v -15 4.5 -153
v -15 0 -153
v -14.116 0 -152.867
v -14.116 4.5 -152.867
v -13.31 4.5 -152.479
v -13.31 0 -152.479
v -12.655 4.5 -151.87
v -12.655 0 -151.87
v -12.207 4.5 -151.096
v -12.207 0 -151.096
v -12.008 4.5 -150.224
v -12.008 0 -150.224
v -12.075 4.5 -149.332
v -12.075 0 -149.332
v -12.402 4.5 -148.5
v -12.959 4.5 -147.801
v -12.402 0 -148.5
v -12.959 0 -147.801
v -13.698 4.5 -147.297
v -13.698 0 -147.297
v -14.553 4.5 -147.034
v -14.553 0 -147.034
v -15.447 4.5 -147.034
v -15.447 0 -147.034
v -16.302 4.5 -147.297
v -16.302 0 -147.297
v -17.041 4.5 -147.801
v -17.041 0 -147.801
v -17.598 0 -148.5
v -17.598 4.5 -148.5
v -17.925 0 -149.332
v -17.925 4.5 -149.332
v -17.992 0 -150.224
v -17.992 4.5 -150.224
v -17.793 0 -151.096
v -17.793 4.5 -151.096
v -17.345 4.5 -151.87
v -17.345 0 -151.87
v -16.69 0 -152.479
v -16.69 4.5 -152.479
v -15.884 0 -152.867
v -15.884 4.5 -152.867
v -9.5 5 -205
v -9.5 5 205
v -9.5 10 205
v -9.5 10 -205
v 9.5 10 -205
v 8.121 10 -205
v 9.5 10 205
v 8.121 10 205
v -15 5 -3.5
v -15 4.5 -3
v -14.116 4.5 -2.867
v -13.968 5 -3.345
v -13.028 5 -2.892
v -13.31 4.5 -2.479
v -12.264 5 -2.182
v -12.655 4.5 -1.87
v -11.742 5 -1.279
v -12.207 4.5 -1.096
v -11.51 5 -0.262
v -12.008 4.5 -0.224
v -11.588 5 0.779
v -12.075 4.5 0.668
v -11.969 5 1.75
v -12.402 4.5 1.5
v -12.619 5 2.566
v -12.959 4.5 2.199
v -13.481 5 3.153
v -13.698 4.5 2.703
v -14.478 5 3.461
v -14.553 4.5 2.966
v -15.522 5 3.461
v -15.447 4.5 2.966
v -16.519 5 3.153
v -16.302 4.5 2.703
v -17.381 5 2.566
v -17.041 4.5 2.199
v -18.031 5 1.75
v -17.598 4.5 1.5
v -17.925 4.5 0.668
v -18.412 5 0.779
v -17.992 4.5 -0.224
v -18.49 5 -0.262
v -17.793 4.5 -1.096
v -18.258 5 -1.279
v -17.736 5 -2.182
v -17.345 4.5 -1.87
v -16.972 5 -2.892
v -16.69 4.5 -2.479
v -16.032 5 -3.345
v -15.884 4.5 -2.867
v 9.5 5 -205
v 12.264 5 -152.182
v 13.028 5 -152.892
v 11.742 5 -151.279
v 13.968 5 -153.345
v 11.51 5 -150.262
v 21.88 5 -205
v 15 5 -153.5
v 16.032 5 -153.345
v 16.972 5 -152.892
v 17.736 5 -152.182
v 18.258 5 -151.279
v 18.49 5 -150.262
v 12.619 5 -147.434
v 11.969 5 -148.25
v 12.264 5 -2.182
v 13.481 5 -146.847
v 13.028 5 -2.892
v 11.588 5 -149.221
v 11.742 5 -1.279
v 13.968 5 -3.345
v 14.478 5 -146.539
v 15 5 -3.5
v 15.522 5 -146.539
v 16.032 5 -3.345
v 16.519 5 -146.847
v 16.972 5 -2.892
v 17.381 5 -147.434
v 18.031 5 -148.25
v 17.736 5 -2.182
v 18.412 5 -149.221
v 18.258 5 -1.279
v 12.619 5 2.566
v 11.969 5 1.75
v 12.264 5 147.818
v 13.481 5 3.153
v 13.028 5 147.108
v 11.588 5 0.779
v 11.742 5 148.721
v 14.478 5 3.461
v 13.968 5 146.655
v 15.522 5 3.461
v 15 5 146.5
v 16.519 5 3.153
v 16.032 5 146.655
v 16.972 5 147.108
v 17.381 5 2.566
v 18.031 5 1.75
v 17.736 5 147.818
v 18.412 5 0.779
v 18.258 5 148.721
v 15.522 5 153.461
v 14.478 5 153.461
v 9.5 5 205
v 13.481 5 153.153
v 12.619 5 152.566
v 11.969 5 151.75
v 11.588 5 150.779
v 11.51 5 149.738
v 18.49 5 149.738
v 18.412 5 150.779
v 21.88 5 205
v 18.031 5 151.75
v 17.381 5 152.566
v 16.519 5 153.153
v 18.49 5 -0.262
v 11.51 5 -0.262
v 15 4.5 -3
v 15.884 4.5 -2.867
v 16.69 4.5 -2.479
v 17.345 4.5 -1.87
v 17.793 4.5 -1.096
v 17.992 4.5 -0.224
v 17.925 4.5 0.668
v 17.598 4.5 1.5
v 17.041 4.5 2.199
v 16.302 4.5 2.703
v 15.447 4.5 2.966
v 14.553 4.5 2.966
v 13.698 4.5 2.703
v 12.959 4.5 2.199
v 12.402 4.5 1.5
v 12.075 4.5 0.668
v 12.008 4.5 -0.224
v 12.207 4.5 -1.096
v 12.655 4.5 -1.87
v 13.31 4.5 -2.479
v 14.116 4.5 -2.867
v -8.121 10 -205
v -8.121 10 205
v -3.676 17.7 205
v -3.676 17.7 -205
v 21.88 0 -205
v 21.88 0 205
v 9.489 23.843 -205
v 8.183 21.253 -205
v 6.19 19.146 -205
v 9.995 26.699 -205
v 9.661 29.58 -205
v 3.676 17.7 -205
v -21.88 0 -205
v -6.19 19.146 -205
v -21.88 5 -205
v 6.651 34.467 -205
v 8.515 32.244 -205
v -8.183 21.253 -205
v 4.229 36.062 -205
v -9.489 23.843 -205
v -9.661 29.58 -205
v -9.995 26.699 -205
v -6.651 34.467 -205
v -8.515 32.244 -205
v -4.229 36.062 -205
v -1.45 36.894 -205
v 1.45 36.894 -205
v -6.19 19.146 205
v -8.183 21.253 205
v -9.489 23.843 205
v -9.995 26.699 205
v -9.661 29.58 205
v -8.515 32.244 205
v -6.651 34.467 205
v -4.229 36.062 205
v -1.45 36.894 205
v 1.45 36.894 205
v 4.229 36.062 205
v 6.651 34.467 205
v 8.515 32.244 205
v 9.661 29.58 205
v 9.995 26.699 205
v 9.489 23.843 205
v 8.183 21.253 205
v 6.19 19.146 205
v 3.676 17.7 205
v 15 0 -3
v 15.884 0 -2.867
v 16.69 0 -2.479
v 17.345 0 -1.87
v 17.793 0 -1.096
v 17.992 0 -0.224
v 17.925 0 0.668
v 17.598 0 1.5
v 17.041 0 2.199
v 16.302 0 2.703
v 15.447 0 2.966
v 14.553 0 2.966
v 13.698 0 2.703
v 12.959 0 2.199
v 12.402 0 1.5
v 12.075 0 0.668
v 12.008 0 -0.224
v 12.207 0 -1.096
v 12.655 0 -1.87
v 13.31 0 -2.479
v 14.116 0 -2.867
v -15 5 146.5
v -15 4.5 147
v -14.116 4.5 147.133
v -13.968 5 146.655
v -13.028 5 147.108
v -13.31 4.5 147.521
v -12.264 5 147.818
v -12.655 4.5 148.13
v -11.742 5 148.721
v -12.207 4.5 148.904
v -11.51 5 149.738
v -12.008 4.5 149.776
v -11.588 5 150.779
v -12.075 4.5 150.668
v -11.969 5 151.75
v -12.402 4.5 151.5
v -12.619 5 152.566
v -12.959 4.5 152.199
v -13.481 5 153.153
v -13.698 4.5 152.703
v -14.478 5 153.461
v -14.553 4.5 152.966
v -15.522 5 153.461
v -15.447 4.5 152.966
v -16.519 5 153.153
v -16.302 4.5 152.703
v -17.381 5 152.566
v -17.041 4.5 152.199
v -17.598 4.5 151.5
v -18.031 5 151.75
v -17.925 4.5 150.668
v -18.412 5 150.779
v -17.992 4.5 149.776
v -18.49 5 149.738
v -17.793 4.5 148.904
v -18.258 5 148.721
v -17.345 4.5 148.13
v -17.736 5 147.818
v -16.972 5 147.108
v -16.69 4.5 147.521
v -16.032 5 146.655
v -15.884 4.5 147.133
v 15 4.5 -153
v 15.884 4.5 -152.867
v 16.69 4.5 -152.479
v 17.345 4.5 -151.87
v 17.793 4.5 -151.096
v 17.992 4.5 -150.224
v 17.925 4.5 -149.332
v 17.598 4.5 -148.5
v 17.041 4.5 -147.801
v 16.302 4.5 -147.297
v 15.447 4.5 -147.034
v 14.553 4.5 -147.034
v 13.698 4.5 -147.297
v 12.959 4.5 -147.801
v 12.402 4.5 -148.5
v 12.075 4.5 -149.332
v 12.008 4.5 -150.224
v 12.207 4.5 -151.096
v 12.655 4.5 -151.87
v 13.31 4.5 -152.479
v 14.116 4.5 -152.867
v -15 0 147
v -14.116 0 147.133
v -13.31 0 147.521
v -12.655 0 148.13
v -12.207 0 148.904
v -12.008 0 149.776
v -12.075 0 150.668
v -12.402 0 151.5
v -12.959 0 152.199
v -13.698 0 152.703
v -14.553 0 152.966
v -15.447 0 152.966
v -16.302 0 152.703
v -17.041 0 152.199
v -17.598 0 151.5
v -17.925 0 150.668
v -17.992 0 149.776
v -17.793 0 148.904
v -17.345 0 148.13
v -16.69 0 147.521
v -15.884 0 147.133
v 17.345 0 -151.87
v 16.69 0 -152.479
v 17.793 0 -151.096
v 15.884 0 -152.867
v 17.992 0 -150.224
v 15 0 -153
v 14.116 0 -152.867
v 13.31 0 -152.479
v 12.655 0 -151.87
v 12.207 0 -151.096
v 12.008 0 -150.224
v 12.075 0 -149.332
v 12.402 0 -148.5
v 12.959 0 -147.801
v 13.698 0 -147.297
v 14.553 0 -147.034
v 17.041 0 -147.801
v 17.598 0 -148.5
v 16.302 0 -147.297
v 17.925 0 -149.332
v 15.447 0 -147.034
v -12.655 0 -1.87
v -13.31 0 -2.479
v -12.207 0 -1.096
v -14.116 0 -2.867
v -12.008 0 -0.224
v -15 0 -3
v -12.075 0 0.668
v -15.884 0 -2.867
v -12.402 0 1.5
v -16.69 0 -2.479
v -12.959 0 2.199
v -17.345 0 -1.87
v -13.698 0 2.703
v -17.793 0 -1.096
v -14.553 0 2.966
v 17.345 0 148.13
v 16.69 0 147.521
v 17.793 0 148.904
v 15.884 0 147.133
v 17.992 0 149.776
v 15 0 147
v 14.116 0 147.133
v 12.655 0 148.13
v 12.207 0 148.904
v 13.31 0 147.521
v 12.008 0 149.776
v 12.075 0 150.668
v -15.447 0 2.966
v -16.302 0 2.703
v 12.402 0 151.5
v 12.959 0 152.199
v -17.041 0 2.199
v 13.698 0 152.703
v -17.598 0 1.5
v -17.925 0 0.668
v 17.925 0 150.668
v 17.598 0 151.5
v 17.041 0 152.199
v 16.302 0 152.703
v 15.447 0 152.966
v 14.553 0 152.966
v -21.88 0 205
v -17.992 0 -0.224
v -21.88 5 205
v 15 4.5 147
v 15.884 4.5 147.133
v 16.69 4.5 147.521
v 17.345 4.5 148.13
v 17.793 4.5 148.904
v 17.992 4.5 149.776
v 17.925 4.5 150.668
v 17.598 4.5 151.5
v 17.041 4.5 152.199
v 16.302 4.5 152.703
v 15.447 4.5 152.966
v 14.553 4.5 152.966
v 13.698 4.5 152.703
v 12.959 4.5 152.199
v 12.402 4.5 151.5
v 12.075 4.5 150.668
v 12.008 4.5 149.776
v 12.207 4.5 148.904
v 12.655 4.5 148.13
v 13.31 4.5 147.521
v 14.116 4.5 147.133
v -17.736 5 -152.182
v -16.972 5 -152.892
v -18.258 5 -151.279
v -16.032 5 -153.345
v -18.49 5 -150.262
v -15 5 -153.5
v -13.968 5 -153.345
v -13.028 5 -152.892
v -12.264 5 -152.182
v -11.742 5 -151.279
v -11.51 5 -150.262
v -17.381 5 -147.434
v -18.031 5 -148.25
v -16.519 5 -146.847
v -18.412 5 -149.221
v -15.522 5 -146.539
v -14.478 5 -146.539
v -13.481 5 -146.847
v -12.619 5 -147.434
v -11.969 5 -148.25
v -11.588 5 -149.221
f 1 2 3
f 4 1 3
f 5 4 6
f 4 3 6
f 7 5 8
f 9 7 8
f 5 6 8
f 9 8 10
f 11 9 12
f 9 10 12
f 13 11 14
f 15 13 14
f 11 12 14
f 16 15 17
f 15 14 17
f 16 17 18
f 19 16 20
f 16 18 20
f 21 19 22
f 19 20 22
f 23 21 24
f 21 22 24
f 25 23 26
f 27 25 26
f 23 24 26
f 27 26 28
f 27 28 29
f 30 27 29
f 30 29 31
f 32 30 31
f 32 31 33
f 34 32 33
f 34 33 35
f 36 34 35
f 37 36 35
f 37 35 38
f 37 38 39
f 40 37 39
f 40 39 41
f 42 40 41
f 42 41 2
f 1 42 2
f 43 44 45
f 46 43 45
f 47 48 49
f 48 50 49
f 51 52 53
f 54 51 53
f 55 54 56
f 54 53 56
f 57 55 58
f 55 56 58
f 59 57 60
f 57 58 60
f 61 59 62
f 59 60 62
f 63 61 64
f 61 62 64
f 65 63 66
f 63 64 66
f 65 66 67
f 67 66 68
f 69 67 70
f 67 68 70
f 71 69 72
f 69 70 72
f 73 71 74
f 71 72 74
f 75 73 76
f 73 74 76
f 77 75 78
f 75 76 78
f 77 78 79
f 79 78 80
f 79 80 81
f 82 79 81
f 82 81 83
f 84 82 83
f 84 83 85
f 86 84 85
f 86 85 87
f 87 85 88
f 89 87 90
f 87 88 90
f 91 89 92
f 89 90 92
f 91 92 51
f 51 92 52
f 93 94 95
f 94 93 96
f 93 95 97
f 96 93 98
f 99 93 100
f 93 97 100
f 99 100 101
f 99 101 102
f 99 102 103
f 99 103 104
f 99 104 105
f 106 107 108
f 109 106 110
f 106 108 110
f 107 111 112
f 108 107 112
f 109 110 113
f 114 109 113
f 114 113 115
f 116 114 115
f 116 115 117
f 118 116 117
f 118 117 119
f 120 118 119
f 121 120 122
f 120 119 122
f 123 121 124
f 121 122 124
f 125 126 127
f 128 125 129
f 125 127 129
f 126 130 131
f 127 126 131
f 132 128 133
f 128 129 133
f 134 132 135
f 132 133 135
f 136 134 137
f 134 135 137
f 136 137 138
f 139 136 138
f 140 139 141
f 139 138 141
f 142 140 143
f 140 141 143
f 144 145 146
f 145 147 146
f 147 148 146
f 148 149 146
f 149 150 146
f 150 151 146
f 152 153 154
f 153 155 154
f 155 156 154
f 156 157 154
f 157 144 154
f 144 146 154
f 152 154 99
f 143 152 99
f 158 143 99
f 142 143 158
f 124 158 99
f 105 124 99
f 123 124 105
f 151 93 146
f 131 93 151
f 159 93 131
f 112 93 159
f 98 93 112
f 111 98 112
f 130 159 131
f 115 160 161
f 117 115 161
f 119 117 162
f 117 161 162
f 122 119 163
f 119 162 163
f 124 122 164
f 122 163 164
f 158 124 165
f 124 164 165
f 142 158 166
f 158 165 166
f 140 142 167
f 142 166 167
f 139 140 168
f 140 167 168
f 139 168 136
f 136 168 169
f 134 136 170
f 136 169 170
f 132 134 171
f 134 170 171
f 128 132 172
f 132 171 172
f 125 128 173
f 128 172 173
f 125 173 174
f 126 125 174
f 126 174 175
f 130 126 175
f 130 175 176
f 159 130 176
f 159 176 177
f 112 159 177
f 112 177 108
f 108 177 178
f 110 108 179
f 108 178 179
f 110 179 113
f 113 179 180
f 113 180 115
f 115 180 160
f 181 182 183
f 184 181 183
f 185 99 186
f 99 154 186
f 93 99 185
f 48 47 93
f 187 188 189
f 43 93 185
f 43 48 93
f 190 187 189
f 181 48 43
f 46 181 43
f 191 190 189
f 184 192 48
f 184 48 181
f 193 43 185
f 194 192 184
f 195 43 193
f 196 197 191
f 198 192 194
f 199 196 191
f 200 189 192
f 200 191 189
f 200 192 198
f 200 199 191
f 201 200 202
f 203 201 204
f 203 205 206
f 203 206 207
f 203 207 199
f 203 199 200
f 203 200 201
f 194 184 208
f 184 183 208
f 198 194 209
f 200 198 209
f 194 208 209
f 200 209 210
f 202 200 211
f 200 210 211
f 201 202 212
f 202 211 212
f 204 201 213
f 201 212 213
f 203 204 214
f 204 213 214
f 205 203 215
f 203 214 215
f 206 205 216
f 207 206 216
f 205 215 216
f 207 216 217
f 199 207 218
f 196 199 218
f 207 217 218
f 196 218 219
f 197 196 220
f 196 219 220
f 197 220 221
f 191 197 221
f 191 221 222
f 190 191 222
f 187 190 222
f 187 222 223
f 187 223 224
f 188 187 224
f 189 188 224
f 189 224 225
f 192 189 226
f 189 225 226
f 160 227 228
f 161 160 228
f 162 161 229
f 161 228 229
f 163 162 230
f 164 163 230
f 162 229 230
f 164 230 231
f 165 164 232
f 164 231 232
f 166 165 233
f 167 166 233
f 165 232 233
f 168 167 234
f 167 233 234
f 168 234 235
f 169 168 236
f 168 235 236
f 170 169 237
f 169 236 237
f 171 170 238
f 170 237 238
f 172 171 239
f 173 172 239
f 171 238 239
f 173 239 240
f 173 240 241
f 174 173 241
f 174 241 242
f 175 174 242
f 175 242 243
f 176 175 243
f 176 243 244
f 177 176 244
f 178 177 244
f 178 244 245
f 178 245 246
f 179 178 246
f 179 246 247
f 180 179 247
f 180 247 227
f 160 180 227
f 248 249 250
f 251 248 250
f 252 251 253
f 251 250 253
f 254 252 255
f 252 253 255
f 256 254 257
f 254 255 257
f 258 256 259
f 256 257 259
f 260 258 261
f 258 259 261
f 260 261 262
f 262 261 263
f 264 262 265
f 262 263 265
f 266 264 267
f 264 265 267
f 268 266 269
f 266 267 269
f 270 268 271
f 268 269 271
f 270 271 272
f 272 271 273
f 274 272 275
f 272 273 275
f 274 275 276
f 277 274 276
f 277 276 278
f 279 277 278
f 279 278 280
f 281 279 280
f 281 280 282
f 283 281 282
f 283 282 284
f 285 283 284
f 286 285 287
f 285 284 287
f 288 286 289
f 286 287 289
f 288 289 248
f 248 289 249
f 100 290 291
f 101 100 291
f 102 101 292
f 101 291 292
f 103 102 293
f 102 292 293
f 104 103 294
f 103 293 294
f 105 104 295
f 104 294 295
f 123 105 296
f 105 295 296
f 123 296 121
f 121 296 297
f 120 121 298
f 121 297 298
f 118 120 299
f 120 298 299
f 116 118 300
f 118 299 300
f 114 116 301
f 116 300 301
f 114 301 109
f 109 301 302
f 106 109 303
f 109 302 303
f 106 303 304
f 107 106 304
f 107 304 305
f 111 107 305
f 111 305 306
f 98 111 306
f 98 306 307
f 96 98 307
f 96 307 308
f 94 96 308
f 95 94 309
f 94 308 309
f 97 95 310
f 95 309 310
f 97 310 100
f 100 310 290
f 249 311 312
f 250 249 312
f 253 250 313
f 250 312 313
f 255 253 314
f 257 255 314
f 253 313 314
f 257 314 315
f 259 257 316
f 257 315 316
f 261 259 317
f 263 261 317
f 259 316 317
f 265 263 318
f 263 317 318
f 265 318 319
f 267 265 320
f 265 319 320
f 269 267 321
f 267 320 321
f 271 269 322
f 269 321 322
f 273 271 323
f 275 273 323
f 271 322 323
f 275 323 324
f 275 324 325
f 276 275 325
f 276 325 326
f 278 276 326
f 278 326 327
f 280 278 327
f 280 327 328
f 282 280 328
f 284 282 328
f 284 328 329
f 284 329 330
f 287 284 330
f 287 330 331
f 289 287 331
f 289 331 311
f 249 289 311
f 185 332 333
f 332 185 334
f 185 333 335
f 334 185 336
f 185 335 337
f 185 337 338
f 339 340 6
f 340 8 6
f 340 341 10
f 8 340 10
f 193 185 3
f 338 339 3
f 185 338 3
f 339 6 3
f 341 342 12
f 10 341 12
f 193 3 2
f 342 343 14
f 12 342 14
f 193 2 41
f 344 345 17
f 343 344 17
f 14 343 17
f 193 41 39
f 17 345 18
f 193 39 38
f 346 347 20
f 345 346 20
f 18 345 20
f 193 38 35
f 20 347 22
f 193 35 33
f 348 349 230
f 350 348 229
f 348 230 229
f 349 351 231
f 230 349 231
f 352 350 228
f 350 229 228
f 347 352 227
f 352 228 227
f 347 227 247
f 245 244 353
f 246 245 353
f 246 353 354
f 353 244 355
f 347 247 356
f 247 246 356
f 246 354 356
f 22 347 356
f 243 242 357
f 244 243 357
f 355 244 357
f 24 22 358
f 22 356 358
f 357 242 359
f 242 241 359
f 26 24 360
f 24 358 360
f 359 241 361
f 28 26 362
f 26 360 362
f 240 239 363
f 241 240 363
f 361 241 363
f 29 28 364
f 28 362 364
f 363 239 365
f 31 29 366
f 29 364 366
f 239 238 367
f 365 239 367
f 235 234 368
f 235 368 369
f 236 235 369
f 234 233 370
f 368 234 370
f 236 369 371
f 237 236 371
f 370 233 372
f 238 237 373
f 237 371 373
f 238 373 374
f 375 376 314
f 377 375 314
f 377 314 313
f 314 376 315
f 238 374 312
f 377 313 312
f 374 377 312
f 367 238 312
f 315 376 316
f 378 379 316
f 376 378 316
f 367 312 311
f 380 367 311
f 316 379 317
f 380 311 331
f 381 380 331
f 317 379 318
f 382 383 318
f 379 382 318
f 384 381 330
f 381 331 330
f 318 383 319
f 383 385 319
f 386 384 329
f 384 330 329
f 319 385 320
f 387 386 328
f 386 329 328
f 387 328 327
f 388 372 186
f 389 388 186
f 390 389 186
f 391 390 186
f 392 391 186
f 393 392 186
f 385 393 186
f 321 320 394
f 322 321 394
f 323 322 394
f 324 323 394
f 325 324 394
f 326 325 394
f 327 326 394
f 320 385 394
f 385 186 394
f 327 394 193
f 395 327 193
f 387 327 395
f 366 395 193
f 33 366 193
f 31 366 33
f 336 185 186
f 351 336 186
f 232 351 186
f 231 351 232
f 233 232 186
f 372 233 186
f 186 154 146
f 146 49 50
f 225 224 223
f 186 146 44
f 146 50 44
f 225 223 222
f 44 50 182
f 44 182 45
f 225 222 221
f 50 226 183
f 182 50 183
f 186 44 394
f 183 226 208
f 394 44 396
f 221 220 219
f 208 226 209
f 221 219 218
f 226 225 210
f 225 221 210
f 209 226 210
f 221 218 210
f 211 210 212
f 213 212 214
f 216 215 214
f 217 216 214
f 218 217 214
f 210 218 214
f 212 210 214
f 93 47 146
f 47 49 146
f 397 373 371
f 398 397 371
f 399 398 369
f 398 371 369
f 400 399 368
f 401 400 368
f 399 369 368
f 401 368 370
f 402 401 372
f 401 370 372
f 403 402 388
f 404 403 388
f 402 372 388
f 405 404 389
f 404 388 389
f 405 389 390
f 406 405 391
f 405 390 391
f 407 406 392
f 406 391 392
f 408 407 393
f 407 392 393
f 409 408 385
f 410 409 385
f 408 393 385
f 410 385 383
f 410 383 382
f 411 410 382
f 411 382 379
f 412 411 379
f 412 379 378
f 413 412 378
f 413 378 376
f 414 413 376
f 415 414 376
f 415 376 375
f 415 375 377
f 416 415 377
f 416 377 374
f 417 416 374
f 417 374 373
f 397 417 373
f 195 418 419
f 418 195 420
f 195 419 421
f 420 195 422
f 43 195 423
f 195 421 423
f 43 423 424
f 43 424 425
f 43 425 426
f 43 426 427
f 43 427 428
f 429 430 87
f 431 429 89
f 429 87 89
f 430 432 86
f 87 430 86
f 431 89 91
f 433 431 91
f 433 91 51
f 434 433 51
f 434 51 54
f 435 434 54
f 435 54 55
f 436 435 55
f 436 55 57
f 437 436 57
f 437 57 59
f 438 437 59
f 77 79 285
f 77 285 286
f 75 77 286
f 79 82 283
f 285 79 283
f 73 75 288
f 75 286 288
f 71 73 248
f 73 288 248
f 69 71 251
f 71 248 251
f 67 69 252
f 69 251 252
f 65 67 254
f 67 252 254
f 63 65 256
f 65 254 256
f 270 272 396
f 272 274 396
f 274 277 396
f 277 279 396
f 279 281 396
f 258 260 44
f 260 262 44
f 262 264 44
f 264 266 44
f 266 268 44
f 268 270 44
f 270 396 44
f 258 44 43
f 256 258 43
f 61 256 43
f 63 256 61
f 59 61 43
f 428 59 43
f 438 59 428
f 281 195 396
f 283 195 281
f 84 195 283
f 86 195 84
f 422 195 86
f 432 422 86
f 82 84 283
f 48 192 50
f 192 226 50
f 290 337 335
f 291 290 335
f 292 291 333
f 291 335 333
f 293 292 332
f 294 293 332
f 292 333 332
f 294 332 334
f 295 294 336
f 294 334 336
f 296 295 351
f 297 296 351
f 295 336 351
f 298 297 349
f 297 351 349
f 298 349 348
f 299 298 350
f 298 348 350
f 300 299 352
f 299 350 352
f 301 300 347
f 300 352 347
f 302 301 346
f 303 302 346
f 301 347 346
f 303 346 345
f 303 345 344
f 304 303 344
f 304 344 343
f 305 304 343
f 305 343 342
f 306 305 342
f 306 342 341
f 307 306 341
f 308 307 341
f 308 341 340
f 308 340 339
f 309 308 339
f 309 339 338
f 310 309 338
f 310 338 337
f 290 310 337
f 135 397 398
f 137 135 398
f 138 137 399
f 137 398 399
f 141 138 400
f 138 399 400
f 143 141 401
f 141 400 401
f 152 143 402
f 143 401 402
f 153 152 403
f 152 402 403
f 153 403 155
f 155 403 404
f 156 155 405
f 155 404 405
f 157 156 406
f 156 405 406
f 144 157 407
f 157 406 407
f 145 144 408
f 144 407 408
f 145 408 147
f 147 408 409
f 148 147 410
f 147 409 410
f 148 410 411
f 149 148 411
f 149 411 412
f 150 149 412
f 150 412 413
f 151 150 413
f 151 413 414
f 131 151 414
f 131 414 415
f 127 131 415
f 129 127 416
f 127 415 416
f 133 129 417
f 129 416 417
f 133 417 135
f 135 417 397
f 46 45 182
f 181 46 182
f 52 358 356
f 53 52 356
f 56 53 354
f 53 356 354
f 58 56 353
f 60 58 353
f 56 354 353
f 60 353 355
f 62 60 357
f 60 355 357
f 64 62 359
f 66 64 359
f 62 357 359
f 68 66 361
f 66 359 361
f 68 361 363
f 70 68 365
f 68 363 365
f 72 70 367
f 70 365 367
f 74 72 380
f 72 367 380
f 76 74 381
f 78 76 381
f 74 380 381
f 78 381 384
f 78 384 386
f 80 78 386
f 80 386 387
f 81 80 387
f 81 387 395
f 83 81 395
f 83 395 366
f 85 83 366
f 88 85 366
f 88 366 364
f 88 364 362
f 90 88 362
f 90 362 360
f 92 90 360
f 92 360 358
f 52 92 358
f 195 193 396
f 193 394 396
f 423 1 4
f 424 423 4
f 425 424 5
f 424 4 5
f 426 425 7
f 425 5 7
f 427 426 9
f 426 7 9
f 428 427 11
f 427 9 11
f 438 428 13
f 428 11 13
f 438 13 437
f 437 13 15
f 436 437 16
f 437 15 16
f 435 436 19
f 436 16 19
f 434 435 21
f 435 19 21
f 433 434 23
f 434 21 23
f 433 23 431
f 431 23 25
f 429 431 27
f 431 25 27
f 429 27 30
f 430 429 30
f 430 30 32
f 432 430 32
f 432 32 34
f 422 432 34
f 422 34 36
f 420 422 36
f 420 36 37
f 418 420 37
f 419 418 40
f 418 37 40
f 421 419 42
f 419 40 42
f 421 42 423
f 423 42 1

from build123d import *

# Parameters (mm, degrees)
SALIENTE_EXTRUIR1_DEPTH = 205
CORTAR_EXTRUIR1_REACH   = 211.458
CROQUIS2_R              = 3
CHAFL_N1_SIZE           = 0.5


with BuildPart() as part:
    # Croquis1 → Saliente-Extruir1 (new, symmetric)
    with BuildSketch(Plane.XY):
        with BuildLine():
            Line((-8.121192263, 10), (-3.67559519, 17.7))
            ThreePointArc((-3.67559519, 17.7), (0, 37), (3.67559519, 17.7))
            Line((3.67559519, 17.7), (8.121192263, 10))
            Line((8.121192263, 10), (9.5, 10))
            Line((9.5, 10), (9.5, 5))
            Line((9.5, 5), (21.88, 5))
            Line((21.88, 5), (21.88, 0))
            Line((21.88, 0), (-21.88, 0))
            Line((-21.88, 0), (-21.88, 5))
            Line((-21.88, 5), (-9.5, 5))
            Line((-9.5, 5), (-9.5, 10))
            Line((-9.5, 10), (-8.121192263, 10))
        make_face()
    extrude(amount=SALIENTE_EXTRUIR1_DEPTH, both=True)

    # Croquis2 → Cortar-Extruir1 (cut, up to next)
    with BuildSketch(Plane.XZ, mode=Mode.PRIVATE) as cortar_extruir1_sk1:
        with Locations(Location((15, 150, 0), (0, 0, 270))):
            Circle(CROQUIS2_R)
    cortar_extruir1_tool1 = extrude(cortar_extruir1_sk1.sketch, amount=-CORTAR_EXTRUIR1_REACH, mode=Mode.PRIVATE) & part.part
    # Croquis2 → Cortar-Extruir1 (cut, up to next)
    with BuildSketch(Plane.XZ, mode=Mode.PRIVATE) as cortar_extruir1_sk2:
        with Locations(Location((-15, 150, 0), (0, 0, 270))):
            Circle(CROQUIS2_R)
    cortar_extruir1_tool2 = extrude(cortar_extruir1_sk2.sketch, amount=-CORTAR_EXTRUIR1_REACH, mode=Mode.PRIVATE) & part.part
    # Croquis2 → Cortar-Extruir1 (cut, up to next)
    with BuildSketch(Plane.XZ, mode=Mode.PRIVATE) as cortar_extruir1_sk3:
        with Locations(Location((-15, 0, 0), (0, 0, 270))):
            Circle(CROQUIS2_R)
    cortar_extruir1_tool3 = extrude(cortar_extruir1_sk3.sketch, amount=-CORTAR_EXTRUIR1_REACH, mode=Mode.PRIVATE) & part.part
    # Croquis2 → Cortar-Extruir1 (cut, up to next)
    with BuildSketch(Plane.XZ, mode=Mode.PRIVATE) as cortar_extruir1_sk4:
        with Locations(Location((15, 0, 0), (0, 0, 270))):
            Circle(CROQUIS2_R)
    cortar_extruir1_tool4 = extrude(cortar_extruir1_sk4.sketch, amount=-CORTAR_EXTRUIR1_REACH, mode=Mode.PRIVATE) & part.part
    # Croquis2 → Cortar-Extruir1 (cut, up to next)
    with BuildSketch(Plane.XZ, mode=Mode.PRIVATE) as cortar_extruir1_sk5:
        with Locations(Location((15, -150, 0), (0, 0, 270))):
            Circle(CROQUIS2_R)
    cortar_extruir1_tool5 = extrude(cortar_extruir1_sk5.sketch, amount=-CORTAR_EXTRUIR1_REACH, mode=Mode.PRIVATE) & part.part
    # Croquis2 → Cortar-Extruir1 (cut, up to next)
    with BuildSketch(Plane.XZ, mode=Mode.PRIVATE) as cortar_extruir1_sk6:
        with Locations(Location((-15, -150, 0), (0, 0, 270))):
            Circle(CROQUIS2_R)
    cortar_extruir1_tool6 = extrude(cortar_extruir1_sk6.sketch, amount=-CORTAR_EXTRUIR1_REACH, mode=Mode.PRIVATE) & part.part
    add(cortar_extruir1_tool1.solids().sort_by_distance((15, 0, 150))[0], mode=Mode.SUBTRACT)
    add(cortar_extruir1_tool2.solids().sort_by_distance((-15, 0, 150))[0], mode=Mode.SUBTRACT)
    add(cortar_extruir1_tool3.solids().sort_by_distance((-15, 0, 0))[0], mode=Mode.SUBTRACT)
    add(cortar_extruir1_tool4.solids().sort_by_distance((15, 0, 0))[0], mode=Mode.SUBTRACT)
    add(cortar_extruir1_tool5.solids().sort_by_distance((15, 0, -150))[0], mode=Mode.SUBTRACT)
    add(cortar_extruir1_tool6.solids().sort_by_distance((-15, 0, -150))[0], mode=Mode.SUBTRACT)

    # Chaflán1
    chafl_n1_edges = [part.edges().sort_by_distance(p)[0] for p in [
        (-15, 5, 153),
        (-15, 5, 3),
        (15, 5, 3),
        (15, 5, -147),
        (-15, 5, -147),
        (15, 5, 153),
    ]]
    chamfer(chafl_n1_edges, length=CHAFL_N1_SIZE)


solid = part.part
